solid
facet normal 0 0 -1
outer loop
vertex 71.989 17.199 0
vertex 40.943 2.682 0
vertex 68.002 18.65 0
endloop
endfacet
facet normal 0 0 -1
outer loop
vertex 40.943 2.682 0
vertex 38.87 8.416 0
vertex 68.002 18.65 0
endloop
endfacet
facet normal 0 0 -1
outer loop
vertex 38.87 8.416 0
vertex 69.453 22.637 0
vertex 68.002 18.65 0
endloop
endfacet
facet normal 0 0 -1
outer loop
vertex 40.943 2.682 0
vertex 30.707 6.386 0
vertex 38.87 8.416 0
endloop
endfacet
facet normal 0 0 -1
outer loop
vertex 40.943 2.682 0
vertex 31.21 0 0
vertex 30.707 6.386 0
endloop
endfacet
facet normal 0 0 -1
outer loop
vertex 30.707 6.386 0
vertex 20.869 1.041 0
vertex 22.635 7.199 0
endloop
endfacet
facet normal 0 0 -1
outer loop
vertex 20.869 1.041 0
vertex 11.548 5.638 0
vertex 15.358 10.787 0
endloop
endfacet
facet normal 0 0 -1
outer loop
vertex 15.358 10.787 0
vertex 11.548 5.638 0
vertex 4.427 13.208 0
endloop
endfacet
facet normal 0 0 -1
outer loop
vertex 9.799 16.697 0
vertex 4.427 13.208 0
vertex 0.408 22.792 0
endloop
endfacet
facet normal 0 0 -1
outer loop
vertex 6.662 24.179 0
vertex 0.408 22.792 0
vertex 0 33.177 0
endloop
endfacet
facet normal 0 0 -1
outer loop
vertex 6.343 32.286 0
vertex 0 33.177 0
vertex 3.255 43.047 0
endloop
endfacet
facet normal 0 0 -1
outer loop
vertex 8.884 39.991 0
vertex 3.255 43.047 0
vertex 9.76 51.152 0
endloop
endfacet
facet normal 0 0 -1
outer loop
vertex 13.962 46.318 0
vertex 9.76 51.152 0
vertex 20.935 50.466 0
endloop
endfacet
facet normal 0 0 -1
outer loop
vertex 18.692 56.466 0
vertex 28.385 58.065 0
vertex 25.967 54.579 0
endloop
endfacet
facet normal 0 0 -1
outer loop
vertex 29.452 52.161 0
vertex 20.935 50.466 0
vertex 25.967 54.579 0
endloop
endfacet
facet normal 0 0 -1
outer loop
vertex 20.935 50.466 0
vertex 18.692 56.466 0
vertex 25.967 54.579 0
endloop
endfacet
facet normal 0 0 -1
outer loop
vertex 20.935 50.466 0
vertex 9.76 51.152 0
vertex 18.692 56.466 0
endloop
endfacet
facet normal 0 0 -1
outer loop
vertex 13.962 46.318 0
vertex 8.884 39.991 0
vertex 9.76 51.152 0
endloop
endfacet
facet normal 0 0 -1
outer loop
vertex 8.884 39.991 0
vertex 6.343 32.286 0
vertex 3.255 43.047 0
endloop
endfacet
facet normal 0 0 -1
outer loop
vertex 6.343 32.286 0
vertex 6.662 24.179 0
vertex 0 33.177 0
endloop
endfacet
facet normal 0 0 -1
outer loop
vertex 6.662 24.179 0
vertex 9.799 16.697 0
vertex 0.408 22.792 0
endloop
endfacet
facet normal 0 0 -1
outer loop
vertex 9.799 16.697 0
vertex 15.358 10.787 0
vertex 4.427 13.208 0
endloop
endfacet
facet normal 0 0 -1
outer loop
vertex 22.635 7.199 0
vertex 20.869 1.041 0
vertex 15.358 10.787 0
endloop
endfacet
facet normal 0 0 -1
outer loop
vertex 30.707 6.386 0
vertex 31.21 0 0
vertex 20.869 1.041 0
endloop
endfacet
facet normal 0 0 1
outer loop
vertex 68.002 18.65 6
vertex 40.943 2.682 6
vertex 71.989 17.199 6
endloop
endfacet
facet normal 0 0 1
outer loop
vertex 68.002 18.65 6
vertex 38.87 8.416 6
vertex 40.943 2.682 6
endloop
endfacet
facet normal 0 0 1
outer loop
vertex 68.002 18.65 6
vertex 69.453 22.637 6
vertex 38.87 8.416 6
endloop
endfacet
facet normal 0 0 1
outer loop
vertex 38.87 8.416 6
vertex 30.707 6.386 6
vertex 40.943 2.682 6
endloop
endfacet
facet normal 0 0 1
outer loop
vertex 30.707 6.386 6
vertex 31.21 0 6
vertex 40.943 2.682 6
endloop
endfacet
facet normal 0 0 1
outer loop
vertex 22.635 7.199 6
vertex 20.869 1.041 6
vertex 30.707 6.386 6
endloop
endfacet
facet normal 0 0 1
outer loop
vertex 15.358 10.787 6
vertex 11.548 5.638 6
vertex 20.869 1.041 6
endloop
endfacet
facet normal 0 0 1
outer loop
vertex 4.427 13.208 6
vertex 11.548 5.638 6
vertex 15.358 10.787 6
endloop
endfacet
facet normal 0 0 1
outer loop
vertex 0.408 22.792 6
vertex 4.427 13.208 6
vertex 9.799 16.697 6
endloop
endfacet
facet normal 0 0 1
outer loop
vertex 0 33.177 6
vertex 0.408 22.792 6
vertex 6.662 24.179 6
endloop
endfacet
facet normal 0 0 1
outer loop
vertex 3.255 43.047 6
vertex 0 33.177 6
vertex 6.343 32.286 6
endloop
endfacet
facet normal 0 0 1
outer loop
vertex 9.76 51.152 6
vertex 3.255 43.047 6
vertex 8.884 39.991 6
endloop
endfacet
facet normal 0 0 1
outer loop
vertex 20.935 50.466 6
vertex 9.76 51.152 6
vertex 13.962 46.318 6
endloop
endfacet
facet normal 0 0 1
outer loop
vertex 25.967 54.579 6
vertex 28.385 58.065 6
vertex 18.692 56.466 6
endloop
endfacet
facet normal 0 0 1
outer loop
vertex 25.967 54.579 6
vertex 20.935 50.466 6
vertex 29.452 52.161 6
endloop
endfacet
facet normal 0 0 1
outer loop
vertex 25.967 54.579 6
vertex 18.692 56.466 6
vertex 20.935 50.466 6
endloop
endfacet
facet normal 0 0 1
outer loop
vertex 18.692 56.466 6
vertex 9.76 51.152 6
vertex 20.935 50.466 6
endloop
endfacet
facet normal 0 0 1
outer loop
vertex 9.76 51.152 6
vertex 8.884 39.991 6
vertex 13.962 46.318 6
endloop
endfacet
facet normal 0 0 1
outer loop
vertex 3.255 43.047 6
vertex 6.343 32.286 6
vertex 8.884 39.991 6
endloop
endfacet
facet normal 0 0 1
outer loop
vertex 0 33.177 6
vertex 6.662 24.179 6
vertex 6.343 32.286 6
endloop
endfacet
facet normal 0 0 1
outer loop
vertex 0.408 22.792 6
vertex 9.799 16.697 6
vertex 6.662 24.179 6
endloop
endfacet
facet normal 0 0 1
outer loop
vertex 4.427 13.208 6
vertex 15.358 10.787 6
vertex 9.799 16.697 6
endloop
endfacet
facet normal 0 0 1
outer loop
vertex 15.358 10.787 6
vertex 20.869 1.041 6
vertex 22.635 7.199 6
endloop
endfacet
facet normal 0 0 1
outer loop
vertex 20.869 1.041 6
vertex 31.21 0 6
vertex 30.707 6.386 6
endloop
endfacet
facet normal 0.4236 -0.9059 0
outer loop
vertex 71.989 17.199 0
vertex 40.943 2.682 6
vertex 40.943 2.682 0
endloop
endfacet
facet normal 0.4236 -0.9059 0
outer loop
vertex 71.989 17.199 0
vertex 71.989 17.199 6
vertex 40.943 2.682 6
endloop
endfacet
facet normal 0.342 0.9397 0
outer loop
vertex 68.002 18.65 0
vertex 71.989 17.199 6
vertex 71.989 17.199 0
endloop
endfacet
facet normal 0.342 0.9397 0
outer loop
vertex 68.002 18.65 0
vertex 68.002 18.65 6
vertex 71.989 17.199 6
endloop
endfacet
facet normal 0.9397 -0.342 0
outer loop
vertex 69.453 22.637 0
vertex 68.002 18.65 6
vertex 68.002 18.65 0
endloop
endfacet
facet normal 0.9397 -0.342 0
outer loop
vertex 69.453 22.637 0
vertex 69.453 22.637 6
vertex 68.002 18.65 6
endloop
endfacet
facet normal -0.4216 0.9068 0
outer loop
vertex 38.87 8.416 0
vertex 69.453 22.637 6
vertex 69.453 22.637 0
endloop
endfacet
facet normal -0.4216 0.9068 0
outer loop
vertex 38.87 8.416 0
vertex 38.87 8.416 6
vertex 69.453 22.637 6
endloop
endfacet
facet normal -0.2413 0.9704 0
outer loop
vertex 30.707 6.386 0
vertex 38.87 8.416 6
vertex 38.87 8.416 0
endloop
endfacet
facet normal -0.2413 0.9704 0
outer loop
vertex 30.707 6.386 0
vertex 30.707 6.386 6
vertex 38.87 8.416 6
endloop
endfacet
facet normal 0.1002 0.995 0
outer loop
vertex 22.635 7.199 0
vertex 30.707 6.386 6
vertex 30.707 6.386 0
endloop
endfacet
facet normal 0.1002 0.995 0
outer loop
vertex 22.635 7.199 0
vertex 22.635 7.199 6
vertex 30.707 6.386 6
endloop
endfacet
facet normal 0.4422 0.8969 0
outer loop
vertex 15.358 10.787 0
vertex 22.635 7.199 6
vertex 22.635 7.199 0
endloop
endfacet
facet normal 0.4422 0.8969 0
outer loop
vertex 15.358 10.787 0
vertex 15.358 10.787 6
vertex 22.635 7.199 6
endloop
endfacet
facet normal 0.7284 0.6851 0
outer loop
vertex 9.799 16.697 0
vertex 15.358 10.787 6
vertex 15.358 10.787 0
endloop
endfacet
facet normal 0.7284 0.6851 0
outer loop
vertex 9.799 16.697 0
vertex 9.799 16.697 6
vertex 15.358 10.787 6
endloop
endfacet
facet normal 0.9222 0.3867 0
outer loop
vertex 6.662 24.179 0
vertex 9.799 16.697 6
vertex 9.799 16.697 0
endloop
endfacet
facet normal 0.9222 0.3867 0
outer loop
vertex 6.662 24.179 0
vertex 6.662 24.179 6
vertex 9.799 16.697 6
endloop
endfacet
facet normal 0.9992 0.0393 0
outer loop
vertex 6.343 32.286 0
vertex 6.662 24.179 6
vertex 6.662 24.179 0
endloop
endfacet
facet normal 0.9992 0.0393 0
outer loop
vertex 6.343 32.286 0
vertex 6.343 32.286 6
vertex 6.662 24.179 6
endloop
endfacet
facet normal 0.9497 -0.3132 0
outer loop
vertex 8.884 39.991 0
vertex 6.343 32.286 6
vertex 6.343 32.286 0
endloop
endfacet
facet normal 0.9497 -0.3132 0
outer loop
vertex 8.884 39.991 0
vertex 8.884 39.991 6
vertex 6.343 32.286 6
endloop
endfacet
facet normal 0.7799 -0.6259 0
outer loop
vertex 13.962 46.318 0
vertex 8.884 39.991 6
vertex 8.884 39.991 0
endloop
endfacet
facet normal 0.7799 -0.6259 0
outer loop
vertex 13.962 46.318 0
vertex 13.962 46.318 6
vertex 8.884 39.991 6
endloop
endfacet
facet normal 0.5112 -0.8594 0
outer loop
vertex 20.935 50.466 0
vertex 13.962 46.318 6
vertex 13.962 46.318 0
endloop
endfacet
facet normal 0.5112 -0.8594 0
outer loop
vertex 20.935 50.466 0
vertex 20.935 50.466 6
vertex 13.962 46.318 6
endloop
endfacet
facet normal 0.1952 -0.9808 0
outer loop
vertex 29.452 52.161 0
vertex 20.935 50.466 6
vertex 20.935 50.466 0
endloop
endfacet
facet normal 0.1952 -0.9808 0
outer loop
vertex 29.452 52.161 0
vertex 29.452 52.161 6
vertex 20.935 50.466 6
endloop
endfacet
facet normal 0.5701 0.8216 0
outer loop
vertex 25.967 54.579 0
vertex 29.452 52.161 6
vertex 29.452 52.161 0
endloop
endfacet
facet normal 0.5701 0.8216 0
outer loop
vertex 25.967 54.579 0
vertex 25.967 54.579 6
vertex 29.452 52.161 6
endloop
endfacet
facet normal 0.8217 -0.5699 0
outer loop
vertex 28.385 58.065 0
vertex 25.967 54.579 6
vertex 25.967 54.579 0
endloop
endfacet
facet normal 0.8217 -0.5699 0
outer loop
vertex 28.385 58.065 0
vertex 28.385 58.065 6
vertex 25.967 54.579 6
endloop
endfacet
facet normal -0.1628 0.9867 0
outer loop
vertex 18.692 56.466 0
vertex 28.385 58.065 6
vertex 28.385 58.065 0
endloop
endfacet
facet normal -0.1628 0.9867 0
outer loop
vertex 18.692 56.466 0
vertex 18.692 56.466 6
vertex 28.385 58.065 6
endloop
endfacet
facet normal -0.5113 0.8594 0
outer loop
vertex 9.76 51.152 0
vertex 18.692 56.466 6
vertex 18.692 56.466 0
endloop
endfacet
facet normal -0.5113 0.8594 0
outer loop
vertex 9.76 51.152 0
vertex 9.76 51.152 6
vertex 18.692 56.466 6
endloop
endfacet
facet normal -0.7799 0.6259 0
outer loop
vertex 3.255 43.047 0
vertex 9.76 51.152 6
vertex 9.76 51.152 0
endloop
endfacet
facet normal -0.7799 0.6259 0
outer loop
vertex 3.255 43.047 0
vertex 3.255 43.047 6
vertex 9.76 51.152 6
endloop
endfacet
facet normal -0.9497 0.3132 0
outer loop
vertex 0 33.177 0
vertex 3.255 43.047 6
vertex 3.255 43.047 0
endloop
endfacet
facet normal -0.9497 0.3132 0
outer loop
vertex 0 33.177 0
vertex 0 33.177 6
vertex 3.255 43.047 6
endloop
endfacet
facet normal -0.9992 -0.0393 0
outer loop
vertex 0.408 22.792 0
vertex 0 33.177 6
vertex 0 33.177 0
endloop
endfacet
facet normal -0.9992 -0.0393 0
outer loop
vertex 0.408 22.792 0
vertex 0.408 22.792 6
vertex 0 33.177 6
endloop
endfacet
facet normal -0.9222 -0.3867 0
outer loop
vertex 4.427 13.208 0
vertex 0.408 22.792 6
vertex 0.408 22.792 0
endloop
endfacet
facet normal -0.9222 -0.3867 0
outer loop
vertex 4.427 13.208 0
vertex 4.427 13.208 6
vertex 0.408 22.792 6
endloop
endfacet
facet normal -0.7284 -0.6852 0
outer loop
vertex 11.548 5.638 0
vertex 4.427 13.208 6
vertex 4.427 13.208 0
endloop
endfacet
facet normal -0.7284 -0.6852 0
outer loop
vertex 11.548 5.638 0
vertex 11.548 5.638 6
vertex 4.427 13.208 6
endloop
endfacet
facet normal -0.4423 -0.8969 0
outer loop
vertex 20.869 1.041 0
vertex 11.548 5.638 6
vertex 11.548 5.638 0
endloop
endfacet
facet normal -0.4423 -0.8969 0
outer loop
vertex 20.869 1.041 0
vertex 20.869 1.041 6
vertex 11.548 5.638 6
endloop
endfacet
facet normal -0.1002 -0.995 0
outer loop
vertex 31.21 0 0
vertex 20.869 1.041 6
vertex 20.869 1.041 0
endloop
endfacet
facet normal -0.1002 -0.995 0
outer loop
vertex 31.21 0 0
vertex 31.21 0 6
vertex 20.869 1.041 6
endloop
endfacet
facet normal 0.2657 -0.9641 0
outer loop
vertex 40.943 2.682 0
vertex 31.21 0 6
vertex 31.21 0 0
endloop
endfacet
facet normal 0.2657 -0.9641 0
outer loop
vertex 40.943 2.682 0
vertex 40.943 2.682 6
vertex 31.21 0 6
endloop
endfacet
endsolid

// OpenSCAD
$fn = 32;

// ----------------------------------------------------------------------
// Hook plate: curl radius 26 mm over 205 degrees, 6 mm thick band
// ----------------------------------------------------------------------

// --- parameters (mm) ---
profile_height = 6;       // extrusion height
profile_points = 26;      // points of the closed outline

profile = [[25.967, 54.579], [28.385, 58.065], [18.692, 56.466], [9.76, 51.152], [3.255, 43.047], [0, 33.177], [0.408, 22.792], [4.427, 13.208], [11.548, 5.638], [20.869, 1.041], [31.21, 0], [40.943, 2.682], [71.989, 17.199], [68.002, 18.65], [69.453, 22.637], [38.87, 8.416], [30.707, 6.386], [22.635, 7.199], [15.358, 10.787], [9.799, 16.697], [6.662, 24.179], [6.343, 32.286], [8.884, 39.991], [13.962, 46.318], [20.935, 50.466], [29.452, 52.161]];  // single closed polygon, 26 points, counter clockwise

// --- the one profile operation ---
linear_extrude(height = profile_height) polygon(points = profile);
